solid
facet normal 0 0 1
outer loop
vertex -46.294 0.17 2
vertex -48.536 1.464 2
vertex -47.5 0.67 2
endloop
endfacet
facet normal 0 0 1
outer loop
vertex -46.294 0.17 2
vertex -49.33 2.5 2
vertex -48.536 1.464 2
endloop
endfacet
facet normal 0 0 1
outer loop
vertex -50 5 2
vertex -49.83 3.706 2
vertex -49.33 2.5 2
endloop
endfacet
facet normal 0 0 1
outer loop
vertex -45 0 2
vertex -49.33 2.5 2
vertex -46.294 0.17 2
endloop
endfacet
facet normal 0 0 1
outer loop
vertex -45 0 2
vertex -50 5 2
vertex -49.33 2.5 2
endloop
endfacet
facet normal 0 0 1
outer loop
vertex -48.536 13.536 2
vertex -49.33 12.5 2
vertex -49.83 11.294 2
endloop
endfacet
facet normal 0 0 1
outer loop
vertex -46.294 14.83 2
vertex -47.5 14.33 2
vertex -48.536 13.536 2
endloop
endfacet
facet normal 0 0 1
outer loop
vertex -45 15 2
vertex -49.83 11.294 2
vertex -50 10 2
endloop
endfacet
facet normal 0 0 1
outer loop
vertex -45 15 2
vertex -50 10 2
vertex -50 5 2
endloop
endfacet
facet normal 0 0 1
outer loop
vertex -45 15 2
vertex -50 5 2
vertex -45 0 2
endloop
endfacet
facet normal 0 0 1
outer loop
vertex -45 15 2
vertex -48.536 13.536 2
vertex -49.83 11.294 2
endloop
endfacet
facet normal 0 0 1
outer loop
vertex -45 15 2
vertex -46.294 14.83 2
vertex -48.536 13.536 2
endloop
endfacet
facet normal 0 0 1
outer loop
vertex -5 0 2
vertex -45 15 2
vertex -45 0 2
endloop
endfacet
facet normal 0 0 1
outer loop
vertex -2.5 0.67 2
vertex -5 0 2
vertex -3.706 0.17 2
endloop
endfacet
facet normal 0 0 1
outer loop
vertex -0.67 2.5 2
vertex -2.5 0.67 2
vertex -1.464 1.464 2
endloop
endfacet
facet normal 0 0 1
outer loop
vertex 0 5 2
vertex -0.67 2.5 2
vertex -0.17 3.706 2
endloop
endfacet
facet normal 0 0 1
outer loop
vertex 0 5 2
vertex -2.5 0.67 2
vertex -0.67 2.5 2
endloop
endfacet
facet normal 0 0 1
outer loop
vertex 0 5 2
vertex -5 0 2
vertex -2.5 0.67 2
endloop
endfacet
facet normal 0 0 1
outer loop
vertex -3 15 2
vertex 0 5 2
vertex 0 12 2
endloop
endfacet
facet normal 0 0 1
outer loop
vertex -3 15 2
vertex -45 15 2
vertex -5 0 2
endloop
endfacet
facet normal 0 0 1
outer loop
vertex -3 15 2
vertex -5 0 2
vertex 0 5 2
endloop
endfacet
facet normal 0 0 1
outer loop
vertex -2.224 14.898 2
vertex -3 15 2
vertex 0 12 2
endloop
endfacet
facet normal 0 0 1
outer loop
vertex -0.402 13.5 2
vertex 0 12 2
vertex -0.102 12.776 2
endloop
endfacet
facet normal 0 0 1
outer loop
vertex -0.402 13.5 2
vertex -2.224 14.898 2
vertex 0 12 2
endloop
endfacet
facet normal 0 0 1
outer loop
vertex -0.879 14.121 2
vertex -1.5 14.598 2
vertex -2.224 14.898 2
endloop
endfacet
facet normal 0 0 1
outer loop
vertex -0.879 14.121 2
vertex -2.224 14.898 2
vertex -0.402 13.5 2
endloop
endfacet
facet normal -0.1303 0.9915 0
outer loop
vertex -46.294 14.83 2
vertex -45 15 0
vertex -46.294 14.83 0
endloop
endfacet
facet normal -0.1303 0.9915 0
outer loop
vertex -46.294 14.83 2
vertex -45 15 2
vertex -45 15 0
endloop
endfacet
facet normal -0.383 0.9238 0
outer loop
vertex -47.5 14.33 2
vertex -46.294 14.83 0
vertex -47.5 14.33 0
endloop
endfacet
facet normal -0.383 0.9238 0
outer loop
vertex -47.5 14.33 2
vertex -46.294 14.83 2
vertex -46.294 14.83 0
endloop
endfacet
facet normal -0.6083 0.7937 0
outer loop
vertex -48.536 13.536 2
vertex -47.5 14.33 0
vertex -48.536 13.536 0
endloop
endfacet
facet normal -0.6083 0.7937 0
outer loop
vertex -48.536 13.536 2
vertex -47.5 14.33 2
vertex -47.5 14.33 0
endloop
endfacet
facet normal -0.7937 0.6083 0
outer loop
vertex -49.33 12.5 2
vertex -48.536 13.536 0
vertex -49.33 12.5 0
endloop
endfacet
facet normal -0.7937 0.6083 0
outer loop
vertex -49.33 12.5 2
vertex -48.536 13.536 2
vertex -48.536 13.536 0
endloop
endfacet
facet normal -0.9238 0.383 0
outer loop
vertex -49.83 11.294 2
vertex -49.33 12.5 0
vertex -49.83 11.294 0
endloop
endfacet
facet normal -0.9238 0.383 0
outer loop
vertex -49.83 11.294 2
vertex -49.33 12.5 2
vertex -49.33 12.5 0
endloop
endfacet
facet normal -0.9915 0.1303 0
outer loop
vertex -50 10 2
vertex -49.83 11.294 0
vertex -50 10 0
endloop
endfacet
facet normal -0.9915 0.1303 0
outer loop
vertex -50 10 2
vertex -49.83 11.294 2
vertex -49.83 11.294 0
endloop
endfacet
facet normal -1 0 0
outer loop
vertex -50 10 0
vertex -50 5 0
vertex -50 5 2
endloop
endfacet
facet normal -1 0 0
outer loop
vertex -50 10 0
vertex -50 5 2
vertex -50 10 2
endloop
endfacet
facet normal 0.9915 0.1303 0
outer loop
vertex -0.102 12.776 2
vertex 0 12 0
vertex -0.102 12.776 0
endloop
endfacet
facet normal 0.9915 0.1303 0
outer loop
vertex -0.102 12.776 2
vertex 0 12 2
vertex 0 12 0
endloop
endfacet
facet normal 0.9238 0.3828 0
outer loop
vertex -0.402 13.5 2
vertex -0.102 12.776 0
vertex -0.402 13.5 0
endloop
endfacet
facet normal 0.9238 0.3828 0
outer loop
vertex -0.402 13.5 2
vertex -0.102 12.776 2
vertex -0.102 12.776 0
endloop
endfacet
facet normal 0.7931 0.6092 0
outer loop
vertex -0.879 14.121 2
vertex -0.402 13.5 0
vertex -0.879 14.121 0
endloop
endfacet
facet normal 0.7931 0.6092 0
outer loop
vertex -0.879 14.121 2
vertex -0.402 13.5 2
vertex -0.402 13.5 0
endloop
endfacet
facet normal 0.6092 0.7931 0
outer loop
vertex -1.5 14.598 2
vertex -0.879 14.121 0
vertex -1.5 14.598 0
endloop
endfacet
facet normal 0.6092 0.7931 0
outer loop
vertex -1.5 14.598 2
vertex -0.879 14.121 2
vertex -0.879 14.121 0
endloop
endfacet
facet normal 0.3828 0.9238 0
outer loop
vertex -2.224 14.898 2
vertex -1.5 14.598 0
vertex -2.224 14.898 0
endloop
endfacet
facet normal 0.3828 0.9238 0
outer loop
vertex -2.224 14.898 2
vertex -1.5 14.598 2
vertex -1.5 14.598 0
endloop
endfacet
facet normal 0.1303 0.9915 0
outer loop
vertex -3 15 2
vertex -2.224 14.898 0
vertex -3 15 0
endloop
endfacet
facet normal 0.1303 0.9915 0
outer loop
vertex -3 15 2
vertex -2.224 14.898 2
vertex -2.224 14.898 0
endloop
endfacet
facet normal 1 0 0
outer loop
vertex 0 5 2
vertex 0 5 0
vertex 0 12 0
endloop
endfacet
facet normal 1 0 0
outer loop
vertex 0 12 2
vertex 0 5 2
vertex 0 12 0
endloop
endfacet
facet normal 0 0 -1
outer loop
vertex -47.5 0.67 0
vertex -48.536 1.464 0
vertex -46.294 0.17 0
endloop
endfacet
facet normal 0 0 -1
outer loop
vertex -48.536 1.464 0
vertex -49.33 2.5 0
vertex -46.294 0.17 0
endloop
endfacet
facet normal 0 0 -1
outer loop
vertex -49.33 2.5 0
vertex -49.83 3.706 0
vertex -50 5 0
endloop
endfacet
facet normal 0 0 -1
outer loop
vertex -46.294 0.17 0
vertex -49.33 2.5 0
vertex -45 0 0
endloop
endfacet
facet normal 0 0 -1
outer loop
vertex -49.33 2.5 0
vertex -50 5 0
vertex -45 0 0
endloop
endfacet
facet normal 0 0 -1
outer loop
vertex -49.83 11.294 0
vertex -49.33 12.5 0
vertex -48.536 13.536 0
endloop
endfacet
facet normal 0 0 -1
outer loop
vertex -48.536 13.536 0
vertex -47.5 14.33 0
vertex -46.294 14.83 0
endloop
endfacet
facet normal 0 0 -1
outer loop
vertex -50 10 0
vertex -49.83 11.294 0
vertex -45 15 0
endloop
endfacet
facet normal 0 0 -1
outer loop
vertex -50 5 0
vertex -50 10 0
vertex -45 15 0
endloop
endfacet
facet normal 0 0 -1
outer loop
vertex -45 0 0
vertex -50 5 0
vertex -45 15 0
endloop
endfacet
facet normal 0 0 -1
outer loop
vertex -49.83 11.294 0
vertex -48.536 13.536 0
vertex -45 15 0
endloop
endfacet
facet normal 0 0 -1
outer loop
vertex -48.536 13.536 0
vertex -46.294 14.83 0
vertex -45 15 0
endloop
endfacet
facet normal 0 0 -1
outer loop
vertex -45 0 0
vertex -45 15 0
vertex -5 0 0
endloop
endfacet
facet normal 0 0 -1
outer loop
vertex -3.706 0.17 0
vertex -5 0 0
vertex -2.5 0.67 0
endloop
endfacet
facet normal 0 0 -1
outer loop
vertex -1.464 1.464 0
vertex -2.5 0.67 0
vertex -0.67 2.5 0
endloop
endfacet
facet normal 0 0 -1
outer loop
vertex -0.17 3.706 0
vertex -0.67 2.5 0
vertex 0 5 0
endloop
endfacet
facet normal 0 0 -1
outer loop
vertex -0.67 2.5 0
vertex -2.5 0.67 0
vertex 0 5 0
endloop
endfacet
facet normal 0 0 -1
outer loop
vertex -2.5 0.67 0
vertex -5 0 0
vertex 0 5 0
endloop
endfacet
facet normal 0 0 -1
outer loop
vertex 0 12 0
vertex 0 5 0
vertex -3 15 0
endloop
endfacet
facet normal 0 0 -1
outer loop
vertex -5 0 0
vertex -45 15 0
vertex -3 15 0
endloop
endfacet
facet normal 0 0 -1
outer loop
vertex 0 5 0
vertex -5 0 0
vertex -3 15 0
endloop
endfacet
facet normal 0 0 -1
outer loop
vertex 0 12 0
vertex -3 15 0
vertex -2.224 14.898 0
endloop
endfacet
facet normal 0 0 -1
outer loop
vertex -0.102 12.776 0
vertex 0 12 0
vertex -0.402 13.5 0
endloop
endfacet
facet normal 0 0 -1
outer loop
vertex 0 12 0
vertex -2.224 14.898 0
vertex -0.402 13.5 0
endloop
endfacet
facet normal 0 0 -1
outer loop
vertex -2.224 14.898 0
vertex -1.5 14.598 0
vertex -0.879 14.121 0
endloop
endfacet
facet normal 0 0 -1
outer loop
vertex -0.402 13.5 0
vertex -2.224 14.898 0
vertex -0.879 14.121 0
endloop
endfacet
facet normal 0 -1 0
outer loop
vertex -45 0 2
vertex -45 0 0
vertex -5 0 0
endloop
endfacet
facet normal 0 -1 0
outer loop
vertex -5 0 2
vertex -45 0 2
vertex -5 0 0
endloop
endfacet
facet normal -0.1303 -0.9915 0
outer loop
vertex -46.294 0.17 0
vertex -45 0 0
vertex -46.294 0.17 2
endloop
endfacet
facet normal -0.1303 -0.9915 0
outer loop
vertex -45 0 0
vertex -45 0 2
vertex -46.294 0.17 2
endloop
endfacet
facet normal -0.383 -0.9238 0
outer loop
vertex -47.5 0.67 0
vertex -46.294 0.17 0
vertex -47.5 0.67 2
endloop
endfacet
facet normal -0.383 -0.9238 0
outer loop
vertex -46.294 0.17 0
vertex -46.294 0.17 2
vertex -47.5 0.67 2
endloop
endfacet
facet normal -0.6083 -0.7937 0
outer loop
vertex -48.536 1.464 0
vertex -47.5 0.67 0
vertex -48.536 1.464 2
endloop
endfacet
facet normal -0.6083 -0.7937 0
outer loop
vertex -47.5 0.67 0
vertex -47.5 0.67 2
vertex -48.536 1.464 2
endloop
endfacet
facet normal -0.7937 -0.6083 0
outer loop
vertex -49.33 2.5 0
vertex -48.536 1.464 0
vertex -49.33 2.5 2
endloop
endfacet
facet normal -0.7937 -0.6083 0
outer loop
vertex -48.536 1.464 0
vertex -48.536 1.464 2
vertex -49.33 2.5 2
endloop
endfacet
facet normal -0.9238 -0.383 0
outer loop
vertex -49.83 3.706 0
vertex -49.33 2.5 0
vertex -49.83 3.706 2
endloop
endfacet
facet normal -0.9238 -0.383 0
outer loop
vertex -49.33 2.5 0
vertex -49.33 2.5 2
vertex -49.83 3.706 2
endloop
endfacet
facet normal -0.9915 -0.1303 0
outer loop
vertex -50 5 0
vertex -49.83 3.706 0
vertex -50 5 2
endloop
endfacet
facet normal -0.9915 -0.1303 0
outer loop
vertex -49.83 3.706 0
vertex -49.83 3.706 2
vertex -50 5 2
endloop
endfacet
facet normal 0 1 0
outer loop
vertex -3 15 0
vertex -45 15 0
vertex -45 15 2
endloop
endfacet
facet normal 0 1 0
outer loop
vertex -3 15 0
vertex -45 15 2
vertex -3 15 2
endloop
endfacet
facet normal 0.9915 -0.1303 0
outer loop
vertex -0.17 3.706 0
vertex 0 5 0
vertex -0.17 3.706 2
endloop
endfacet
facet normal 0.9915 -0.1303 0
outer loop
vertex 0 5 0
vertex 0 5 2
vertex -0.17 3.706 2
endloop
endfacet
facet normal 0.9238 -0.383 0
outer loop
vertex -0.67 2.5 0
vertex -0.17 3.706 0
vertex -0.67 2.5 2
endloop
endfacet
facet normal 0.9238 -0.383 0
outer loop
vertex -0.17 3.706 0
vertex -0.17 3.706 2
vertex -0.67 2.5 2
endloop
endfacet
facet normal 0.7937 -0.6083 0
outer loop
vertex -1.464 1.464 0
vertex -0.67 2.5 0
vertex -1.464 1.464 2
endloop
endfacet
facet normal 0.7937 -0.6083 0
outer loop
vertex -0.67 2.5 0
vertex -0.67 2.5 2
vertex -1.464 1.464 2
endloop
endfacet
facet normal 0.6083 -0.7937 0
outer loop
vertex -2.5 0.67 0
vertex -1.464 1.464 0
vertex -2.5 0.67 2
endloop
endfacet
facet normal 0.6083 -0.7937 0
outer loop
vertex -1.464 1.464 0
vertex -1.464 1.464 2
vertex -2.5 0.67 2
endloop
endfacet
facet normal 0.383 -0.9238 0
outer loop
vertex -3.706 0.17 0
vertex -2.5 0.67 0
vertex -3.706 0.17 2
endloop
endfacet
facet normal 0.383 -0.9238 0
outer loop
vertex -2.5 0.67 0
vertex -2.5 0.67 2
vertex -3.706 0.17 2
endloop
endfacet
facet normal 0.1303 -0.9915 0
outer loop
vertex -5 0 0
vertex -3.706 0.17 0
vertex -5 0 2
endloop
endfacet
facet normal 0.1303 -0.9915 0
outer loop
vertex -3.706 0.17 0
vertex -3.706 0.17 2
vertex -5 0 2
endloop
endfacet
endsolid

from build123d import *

# Parameters (mm, degrees)
F0_W     = 50
F0_H     = 15
F1_DEPTH = 2
F2_R     = 3
F3_R     = 5
F4_R     = 5


with BuildPart() as f1:
    # F0 (on Top) → F1 (new body)
    with BuildSketch(Plane.XY):
        with Locations((-25, 7.5)):
            Rectangle(F0_W, F0_H)
    extrude(amount=F1_DEPTH)

    # F2
    f2_edges = [f1.edges().sort_by_distance(p)[0] for p in [
        (0, 15, 1),
    ]]
    fillet(f2_edges, radius=F2_R)

    # F3
    f3_edges = [f1.edges().sort_by_distance(p)[0] for p in [
        (0, 0, 1),
    ]]
    fillet(f3_edges, radius=F3_R)

    # F4
    f4_edges = [f1.edges().sort_by_distance(p)[0] for p in [
        (-50, 15, 1),
        (-50, 0, 1),
    ]]
    fillet(f4_edges, radius=F4_R)


solid = f1.part
